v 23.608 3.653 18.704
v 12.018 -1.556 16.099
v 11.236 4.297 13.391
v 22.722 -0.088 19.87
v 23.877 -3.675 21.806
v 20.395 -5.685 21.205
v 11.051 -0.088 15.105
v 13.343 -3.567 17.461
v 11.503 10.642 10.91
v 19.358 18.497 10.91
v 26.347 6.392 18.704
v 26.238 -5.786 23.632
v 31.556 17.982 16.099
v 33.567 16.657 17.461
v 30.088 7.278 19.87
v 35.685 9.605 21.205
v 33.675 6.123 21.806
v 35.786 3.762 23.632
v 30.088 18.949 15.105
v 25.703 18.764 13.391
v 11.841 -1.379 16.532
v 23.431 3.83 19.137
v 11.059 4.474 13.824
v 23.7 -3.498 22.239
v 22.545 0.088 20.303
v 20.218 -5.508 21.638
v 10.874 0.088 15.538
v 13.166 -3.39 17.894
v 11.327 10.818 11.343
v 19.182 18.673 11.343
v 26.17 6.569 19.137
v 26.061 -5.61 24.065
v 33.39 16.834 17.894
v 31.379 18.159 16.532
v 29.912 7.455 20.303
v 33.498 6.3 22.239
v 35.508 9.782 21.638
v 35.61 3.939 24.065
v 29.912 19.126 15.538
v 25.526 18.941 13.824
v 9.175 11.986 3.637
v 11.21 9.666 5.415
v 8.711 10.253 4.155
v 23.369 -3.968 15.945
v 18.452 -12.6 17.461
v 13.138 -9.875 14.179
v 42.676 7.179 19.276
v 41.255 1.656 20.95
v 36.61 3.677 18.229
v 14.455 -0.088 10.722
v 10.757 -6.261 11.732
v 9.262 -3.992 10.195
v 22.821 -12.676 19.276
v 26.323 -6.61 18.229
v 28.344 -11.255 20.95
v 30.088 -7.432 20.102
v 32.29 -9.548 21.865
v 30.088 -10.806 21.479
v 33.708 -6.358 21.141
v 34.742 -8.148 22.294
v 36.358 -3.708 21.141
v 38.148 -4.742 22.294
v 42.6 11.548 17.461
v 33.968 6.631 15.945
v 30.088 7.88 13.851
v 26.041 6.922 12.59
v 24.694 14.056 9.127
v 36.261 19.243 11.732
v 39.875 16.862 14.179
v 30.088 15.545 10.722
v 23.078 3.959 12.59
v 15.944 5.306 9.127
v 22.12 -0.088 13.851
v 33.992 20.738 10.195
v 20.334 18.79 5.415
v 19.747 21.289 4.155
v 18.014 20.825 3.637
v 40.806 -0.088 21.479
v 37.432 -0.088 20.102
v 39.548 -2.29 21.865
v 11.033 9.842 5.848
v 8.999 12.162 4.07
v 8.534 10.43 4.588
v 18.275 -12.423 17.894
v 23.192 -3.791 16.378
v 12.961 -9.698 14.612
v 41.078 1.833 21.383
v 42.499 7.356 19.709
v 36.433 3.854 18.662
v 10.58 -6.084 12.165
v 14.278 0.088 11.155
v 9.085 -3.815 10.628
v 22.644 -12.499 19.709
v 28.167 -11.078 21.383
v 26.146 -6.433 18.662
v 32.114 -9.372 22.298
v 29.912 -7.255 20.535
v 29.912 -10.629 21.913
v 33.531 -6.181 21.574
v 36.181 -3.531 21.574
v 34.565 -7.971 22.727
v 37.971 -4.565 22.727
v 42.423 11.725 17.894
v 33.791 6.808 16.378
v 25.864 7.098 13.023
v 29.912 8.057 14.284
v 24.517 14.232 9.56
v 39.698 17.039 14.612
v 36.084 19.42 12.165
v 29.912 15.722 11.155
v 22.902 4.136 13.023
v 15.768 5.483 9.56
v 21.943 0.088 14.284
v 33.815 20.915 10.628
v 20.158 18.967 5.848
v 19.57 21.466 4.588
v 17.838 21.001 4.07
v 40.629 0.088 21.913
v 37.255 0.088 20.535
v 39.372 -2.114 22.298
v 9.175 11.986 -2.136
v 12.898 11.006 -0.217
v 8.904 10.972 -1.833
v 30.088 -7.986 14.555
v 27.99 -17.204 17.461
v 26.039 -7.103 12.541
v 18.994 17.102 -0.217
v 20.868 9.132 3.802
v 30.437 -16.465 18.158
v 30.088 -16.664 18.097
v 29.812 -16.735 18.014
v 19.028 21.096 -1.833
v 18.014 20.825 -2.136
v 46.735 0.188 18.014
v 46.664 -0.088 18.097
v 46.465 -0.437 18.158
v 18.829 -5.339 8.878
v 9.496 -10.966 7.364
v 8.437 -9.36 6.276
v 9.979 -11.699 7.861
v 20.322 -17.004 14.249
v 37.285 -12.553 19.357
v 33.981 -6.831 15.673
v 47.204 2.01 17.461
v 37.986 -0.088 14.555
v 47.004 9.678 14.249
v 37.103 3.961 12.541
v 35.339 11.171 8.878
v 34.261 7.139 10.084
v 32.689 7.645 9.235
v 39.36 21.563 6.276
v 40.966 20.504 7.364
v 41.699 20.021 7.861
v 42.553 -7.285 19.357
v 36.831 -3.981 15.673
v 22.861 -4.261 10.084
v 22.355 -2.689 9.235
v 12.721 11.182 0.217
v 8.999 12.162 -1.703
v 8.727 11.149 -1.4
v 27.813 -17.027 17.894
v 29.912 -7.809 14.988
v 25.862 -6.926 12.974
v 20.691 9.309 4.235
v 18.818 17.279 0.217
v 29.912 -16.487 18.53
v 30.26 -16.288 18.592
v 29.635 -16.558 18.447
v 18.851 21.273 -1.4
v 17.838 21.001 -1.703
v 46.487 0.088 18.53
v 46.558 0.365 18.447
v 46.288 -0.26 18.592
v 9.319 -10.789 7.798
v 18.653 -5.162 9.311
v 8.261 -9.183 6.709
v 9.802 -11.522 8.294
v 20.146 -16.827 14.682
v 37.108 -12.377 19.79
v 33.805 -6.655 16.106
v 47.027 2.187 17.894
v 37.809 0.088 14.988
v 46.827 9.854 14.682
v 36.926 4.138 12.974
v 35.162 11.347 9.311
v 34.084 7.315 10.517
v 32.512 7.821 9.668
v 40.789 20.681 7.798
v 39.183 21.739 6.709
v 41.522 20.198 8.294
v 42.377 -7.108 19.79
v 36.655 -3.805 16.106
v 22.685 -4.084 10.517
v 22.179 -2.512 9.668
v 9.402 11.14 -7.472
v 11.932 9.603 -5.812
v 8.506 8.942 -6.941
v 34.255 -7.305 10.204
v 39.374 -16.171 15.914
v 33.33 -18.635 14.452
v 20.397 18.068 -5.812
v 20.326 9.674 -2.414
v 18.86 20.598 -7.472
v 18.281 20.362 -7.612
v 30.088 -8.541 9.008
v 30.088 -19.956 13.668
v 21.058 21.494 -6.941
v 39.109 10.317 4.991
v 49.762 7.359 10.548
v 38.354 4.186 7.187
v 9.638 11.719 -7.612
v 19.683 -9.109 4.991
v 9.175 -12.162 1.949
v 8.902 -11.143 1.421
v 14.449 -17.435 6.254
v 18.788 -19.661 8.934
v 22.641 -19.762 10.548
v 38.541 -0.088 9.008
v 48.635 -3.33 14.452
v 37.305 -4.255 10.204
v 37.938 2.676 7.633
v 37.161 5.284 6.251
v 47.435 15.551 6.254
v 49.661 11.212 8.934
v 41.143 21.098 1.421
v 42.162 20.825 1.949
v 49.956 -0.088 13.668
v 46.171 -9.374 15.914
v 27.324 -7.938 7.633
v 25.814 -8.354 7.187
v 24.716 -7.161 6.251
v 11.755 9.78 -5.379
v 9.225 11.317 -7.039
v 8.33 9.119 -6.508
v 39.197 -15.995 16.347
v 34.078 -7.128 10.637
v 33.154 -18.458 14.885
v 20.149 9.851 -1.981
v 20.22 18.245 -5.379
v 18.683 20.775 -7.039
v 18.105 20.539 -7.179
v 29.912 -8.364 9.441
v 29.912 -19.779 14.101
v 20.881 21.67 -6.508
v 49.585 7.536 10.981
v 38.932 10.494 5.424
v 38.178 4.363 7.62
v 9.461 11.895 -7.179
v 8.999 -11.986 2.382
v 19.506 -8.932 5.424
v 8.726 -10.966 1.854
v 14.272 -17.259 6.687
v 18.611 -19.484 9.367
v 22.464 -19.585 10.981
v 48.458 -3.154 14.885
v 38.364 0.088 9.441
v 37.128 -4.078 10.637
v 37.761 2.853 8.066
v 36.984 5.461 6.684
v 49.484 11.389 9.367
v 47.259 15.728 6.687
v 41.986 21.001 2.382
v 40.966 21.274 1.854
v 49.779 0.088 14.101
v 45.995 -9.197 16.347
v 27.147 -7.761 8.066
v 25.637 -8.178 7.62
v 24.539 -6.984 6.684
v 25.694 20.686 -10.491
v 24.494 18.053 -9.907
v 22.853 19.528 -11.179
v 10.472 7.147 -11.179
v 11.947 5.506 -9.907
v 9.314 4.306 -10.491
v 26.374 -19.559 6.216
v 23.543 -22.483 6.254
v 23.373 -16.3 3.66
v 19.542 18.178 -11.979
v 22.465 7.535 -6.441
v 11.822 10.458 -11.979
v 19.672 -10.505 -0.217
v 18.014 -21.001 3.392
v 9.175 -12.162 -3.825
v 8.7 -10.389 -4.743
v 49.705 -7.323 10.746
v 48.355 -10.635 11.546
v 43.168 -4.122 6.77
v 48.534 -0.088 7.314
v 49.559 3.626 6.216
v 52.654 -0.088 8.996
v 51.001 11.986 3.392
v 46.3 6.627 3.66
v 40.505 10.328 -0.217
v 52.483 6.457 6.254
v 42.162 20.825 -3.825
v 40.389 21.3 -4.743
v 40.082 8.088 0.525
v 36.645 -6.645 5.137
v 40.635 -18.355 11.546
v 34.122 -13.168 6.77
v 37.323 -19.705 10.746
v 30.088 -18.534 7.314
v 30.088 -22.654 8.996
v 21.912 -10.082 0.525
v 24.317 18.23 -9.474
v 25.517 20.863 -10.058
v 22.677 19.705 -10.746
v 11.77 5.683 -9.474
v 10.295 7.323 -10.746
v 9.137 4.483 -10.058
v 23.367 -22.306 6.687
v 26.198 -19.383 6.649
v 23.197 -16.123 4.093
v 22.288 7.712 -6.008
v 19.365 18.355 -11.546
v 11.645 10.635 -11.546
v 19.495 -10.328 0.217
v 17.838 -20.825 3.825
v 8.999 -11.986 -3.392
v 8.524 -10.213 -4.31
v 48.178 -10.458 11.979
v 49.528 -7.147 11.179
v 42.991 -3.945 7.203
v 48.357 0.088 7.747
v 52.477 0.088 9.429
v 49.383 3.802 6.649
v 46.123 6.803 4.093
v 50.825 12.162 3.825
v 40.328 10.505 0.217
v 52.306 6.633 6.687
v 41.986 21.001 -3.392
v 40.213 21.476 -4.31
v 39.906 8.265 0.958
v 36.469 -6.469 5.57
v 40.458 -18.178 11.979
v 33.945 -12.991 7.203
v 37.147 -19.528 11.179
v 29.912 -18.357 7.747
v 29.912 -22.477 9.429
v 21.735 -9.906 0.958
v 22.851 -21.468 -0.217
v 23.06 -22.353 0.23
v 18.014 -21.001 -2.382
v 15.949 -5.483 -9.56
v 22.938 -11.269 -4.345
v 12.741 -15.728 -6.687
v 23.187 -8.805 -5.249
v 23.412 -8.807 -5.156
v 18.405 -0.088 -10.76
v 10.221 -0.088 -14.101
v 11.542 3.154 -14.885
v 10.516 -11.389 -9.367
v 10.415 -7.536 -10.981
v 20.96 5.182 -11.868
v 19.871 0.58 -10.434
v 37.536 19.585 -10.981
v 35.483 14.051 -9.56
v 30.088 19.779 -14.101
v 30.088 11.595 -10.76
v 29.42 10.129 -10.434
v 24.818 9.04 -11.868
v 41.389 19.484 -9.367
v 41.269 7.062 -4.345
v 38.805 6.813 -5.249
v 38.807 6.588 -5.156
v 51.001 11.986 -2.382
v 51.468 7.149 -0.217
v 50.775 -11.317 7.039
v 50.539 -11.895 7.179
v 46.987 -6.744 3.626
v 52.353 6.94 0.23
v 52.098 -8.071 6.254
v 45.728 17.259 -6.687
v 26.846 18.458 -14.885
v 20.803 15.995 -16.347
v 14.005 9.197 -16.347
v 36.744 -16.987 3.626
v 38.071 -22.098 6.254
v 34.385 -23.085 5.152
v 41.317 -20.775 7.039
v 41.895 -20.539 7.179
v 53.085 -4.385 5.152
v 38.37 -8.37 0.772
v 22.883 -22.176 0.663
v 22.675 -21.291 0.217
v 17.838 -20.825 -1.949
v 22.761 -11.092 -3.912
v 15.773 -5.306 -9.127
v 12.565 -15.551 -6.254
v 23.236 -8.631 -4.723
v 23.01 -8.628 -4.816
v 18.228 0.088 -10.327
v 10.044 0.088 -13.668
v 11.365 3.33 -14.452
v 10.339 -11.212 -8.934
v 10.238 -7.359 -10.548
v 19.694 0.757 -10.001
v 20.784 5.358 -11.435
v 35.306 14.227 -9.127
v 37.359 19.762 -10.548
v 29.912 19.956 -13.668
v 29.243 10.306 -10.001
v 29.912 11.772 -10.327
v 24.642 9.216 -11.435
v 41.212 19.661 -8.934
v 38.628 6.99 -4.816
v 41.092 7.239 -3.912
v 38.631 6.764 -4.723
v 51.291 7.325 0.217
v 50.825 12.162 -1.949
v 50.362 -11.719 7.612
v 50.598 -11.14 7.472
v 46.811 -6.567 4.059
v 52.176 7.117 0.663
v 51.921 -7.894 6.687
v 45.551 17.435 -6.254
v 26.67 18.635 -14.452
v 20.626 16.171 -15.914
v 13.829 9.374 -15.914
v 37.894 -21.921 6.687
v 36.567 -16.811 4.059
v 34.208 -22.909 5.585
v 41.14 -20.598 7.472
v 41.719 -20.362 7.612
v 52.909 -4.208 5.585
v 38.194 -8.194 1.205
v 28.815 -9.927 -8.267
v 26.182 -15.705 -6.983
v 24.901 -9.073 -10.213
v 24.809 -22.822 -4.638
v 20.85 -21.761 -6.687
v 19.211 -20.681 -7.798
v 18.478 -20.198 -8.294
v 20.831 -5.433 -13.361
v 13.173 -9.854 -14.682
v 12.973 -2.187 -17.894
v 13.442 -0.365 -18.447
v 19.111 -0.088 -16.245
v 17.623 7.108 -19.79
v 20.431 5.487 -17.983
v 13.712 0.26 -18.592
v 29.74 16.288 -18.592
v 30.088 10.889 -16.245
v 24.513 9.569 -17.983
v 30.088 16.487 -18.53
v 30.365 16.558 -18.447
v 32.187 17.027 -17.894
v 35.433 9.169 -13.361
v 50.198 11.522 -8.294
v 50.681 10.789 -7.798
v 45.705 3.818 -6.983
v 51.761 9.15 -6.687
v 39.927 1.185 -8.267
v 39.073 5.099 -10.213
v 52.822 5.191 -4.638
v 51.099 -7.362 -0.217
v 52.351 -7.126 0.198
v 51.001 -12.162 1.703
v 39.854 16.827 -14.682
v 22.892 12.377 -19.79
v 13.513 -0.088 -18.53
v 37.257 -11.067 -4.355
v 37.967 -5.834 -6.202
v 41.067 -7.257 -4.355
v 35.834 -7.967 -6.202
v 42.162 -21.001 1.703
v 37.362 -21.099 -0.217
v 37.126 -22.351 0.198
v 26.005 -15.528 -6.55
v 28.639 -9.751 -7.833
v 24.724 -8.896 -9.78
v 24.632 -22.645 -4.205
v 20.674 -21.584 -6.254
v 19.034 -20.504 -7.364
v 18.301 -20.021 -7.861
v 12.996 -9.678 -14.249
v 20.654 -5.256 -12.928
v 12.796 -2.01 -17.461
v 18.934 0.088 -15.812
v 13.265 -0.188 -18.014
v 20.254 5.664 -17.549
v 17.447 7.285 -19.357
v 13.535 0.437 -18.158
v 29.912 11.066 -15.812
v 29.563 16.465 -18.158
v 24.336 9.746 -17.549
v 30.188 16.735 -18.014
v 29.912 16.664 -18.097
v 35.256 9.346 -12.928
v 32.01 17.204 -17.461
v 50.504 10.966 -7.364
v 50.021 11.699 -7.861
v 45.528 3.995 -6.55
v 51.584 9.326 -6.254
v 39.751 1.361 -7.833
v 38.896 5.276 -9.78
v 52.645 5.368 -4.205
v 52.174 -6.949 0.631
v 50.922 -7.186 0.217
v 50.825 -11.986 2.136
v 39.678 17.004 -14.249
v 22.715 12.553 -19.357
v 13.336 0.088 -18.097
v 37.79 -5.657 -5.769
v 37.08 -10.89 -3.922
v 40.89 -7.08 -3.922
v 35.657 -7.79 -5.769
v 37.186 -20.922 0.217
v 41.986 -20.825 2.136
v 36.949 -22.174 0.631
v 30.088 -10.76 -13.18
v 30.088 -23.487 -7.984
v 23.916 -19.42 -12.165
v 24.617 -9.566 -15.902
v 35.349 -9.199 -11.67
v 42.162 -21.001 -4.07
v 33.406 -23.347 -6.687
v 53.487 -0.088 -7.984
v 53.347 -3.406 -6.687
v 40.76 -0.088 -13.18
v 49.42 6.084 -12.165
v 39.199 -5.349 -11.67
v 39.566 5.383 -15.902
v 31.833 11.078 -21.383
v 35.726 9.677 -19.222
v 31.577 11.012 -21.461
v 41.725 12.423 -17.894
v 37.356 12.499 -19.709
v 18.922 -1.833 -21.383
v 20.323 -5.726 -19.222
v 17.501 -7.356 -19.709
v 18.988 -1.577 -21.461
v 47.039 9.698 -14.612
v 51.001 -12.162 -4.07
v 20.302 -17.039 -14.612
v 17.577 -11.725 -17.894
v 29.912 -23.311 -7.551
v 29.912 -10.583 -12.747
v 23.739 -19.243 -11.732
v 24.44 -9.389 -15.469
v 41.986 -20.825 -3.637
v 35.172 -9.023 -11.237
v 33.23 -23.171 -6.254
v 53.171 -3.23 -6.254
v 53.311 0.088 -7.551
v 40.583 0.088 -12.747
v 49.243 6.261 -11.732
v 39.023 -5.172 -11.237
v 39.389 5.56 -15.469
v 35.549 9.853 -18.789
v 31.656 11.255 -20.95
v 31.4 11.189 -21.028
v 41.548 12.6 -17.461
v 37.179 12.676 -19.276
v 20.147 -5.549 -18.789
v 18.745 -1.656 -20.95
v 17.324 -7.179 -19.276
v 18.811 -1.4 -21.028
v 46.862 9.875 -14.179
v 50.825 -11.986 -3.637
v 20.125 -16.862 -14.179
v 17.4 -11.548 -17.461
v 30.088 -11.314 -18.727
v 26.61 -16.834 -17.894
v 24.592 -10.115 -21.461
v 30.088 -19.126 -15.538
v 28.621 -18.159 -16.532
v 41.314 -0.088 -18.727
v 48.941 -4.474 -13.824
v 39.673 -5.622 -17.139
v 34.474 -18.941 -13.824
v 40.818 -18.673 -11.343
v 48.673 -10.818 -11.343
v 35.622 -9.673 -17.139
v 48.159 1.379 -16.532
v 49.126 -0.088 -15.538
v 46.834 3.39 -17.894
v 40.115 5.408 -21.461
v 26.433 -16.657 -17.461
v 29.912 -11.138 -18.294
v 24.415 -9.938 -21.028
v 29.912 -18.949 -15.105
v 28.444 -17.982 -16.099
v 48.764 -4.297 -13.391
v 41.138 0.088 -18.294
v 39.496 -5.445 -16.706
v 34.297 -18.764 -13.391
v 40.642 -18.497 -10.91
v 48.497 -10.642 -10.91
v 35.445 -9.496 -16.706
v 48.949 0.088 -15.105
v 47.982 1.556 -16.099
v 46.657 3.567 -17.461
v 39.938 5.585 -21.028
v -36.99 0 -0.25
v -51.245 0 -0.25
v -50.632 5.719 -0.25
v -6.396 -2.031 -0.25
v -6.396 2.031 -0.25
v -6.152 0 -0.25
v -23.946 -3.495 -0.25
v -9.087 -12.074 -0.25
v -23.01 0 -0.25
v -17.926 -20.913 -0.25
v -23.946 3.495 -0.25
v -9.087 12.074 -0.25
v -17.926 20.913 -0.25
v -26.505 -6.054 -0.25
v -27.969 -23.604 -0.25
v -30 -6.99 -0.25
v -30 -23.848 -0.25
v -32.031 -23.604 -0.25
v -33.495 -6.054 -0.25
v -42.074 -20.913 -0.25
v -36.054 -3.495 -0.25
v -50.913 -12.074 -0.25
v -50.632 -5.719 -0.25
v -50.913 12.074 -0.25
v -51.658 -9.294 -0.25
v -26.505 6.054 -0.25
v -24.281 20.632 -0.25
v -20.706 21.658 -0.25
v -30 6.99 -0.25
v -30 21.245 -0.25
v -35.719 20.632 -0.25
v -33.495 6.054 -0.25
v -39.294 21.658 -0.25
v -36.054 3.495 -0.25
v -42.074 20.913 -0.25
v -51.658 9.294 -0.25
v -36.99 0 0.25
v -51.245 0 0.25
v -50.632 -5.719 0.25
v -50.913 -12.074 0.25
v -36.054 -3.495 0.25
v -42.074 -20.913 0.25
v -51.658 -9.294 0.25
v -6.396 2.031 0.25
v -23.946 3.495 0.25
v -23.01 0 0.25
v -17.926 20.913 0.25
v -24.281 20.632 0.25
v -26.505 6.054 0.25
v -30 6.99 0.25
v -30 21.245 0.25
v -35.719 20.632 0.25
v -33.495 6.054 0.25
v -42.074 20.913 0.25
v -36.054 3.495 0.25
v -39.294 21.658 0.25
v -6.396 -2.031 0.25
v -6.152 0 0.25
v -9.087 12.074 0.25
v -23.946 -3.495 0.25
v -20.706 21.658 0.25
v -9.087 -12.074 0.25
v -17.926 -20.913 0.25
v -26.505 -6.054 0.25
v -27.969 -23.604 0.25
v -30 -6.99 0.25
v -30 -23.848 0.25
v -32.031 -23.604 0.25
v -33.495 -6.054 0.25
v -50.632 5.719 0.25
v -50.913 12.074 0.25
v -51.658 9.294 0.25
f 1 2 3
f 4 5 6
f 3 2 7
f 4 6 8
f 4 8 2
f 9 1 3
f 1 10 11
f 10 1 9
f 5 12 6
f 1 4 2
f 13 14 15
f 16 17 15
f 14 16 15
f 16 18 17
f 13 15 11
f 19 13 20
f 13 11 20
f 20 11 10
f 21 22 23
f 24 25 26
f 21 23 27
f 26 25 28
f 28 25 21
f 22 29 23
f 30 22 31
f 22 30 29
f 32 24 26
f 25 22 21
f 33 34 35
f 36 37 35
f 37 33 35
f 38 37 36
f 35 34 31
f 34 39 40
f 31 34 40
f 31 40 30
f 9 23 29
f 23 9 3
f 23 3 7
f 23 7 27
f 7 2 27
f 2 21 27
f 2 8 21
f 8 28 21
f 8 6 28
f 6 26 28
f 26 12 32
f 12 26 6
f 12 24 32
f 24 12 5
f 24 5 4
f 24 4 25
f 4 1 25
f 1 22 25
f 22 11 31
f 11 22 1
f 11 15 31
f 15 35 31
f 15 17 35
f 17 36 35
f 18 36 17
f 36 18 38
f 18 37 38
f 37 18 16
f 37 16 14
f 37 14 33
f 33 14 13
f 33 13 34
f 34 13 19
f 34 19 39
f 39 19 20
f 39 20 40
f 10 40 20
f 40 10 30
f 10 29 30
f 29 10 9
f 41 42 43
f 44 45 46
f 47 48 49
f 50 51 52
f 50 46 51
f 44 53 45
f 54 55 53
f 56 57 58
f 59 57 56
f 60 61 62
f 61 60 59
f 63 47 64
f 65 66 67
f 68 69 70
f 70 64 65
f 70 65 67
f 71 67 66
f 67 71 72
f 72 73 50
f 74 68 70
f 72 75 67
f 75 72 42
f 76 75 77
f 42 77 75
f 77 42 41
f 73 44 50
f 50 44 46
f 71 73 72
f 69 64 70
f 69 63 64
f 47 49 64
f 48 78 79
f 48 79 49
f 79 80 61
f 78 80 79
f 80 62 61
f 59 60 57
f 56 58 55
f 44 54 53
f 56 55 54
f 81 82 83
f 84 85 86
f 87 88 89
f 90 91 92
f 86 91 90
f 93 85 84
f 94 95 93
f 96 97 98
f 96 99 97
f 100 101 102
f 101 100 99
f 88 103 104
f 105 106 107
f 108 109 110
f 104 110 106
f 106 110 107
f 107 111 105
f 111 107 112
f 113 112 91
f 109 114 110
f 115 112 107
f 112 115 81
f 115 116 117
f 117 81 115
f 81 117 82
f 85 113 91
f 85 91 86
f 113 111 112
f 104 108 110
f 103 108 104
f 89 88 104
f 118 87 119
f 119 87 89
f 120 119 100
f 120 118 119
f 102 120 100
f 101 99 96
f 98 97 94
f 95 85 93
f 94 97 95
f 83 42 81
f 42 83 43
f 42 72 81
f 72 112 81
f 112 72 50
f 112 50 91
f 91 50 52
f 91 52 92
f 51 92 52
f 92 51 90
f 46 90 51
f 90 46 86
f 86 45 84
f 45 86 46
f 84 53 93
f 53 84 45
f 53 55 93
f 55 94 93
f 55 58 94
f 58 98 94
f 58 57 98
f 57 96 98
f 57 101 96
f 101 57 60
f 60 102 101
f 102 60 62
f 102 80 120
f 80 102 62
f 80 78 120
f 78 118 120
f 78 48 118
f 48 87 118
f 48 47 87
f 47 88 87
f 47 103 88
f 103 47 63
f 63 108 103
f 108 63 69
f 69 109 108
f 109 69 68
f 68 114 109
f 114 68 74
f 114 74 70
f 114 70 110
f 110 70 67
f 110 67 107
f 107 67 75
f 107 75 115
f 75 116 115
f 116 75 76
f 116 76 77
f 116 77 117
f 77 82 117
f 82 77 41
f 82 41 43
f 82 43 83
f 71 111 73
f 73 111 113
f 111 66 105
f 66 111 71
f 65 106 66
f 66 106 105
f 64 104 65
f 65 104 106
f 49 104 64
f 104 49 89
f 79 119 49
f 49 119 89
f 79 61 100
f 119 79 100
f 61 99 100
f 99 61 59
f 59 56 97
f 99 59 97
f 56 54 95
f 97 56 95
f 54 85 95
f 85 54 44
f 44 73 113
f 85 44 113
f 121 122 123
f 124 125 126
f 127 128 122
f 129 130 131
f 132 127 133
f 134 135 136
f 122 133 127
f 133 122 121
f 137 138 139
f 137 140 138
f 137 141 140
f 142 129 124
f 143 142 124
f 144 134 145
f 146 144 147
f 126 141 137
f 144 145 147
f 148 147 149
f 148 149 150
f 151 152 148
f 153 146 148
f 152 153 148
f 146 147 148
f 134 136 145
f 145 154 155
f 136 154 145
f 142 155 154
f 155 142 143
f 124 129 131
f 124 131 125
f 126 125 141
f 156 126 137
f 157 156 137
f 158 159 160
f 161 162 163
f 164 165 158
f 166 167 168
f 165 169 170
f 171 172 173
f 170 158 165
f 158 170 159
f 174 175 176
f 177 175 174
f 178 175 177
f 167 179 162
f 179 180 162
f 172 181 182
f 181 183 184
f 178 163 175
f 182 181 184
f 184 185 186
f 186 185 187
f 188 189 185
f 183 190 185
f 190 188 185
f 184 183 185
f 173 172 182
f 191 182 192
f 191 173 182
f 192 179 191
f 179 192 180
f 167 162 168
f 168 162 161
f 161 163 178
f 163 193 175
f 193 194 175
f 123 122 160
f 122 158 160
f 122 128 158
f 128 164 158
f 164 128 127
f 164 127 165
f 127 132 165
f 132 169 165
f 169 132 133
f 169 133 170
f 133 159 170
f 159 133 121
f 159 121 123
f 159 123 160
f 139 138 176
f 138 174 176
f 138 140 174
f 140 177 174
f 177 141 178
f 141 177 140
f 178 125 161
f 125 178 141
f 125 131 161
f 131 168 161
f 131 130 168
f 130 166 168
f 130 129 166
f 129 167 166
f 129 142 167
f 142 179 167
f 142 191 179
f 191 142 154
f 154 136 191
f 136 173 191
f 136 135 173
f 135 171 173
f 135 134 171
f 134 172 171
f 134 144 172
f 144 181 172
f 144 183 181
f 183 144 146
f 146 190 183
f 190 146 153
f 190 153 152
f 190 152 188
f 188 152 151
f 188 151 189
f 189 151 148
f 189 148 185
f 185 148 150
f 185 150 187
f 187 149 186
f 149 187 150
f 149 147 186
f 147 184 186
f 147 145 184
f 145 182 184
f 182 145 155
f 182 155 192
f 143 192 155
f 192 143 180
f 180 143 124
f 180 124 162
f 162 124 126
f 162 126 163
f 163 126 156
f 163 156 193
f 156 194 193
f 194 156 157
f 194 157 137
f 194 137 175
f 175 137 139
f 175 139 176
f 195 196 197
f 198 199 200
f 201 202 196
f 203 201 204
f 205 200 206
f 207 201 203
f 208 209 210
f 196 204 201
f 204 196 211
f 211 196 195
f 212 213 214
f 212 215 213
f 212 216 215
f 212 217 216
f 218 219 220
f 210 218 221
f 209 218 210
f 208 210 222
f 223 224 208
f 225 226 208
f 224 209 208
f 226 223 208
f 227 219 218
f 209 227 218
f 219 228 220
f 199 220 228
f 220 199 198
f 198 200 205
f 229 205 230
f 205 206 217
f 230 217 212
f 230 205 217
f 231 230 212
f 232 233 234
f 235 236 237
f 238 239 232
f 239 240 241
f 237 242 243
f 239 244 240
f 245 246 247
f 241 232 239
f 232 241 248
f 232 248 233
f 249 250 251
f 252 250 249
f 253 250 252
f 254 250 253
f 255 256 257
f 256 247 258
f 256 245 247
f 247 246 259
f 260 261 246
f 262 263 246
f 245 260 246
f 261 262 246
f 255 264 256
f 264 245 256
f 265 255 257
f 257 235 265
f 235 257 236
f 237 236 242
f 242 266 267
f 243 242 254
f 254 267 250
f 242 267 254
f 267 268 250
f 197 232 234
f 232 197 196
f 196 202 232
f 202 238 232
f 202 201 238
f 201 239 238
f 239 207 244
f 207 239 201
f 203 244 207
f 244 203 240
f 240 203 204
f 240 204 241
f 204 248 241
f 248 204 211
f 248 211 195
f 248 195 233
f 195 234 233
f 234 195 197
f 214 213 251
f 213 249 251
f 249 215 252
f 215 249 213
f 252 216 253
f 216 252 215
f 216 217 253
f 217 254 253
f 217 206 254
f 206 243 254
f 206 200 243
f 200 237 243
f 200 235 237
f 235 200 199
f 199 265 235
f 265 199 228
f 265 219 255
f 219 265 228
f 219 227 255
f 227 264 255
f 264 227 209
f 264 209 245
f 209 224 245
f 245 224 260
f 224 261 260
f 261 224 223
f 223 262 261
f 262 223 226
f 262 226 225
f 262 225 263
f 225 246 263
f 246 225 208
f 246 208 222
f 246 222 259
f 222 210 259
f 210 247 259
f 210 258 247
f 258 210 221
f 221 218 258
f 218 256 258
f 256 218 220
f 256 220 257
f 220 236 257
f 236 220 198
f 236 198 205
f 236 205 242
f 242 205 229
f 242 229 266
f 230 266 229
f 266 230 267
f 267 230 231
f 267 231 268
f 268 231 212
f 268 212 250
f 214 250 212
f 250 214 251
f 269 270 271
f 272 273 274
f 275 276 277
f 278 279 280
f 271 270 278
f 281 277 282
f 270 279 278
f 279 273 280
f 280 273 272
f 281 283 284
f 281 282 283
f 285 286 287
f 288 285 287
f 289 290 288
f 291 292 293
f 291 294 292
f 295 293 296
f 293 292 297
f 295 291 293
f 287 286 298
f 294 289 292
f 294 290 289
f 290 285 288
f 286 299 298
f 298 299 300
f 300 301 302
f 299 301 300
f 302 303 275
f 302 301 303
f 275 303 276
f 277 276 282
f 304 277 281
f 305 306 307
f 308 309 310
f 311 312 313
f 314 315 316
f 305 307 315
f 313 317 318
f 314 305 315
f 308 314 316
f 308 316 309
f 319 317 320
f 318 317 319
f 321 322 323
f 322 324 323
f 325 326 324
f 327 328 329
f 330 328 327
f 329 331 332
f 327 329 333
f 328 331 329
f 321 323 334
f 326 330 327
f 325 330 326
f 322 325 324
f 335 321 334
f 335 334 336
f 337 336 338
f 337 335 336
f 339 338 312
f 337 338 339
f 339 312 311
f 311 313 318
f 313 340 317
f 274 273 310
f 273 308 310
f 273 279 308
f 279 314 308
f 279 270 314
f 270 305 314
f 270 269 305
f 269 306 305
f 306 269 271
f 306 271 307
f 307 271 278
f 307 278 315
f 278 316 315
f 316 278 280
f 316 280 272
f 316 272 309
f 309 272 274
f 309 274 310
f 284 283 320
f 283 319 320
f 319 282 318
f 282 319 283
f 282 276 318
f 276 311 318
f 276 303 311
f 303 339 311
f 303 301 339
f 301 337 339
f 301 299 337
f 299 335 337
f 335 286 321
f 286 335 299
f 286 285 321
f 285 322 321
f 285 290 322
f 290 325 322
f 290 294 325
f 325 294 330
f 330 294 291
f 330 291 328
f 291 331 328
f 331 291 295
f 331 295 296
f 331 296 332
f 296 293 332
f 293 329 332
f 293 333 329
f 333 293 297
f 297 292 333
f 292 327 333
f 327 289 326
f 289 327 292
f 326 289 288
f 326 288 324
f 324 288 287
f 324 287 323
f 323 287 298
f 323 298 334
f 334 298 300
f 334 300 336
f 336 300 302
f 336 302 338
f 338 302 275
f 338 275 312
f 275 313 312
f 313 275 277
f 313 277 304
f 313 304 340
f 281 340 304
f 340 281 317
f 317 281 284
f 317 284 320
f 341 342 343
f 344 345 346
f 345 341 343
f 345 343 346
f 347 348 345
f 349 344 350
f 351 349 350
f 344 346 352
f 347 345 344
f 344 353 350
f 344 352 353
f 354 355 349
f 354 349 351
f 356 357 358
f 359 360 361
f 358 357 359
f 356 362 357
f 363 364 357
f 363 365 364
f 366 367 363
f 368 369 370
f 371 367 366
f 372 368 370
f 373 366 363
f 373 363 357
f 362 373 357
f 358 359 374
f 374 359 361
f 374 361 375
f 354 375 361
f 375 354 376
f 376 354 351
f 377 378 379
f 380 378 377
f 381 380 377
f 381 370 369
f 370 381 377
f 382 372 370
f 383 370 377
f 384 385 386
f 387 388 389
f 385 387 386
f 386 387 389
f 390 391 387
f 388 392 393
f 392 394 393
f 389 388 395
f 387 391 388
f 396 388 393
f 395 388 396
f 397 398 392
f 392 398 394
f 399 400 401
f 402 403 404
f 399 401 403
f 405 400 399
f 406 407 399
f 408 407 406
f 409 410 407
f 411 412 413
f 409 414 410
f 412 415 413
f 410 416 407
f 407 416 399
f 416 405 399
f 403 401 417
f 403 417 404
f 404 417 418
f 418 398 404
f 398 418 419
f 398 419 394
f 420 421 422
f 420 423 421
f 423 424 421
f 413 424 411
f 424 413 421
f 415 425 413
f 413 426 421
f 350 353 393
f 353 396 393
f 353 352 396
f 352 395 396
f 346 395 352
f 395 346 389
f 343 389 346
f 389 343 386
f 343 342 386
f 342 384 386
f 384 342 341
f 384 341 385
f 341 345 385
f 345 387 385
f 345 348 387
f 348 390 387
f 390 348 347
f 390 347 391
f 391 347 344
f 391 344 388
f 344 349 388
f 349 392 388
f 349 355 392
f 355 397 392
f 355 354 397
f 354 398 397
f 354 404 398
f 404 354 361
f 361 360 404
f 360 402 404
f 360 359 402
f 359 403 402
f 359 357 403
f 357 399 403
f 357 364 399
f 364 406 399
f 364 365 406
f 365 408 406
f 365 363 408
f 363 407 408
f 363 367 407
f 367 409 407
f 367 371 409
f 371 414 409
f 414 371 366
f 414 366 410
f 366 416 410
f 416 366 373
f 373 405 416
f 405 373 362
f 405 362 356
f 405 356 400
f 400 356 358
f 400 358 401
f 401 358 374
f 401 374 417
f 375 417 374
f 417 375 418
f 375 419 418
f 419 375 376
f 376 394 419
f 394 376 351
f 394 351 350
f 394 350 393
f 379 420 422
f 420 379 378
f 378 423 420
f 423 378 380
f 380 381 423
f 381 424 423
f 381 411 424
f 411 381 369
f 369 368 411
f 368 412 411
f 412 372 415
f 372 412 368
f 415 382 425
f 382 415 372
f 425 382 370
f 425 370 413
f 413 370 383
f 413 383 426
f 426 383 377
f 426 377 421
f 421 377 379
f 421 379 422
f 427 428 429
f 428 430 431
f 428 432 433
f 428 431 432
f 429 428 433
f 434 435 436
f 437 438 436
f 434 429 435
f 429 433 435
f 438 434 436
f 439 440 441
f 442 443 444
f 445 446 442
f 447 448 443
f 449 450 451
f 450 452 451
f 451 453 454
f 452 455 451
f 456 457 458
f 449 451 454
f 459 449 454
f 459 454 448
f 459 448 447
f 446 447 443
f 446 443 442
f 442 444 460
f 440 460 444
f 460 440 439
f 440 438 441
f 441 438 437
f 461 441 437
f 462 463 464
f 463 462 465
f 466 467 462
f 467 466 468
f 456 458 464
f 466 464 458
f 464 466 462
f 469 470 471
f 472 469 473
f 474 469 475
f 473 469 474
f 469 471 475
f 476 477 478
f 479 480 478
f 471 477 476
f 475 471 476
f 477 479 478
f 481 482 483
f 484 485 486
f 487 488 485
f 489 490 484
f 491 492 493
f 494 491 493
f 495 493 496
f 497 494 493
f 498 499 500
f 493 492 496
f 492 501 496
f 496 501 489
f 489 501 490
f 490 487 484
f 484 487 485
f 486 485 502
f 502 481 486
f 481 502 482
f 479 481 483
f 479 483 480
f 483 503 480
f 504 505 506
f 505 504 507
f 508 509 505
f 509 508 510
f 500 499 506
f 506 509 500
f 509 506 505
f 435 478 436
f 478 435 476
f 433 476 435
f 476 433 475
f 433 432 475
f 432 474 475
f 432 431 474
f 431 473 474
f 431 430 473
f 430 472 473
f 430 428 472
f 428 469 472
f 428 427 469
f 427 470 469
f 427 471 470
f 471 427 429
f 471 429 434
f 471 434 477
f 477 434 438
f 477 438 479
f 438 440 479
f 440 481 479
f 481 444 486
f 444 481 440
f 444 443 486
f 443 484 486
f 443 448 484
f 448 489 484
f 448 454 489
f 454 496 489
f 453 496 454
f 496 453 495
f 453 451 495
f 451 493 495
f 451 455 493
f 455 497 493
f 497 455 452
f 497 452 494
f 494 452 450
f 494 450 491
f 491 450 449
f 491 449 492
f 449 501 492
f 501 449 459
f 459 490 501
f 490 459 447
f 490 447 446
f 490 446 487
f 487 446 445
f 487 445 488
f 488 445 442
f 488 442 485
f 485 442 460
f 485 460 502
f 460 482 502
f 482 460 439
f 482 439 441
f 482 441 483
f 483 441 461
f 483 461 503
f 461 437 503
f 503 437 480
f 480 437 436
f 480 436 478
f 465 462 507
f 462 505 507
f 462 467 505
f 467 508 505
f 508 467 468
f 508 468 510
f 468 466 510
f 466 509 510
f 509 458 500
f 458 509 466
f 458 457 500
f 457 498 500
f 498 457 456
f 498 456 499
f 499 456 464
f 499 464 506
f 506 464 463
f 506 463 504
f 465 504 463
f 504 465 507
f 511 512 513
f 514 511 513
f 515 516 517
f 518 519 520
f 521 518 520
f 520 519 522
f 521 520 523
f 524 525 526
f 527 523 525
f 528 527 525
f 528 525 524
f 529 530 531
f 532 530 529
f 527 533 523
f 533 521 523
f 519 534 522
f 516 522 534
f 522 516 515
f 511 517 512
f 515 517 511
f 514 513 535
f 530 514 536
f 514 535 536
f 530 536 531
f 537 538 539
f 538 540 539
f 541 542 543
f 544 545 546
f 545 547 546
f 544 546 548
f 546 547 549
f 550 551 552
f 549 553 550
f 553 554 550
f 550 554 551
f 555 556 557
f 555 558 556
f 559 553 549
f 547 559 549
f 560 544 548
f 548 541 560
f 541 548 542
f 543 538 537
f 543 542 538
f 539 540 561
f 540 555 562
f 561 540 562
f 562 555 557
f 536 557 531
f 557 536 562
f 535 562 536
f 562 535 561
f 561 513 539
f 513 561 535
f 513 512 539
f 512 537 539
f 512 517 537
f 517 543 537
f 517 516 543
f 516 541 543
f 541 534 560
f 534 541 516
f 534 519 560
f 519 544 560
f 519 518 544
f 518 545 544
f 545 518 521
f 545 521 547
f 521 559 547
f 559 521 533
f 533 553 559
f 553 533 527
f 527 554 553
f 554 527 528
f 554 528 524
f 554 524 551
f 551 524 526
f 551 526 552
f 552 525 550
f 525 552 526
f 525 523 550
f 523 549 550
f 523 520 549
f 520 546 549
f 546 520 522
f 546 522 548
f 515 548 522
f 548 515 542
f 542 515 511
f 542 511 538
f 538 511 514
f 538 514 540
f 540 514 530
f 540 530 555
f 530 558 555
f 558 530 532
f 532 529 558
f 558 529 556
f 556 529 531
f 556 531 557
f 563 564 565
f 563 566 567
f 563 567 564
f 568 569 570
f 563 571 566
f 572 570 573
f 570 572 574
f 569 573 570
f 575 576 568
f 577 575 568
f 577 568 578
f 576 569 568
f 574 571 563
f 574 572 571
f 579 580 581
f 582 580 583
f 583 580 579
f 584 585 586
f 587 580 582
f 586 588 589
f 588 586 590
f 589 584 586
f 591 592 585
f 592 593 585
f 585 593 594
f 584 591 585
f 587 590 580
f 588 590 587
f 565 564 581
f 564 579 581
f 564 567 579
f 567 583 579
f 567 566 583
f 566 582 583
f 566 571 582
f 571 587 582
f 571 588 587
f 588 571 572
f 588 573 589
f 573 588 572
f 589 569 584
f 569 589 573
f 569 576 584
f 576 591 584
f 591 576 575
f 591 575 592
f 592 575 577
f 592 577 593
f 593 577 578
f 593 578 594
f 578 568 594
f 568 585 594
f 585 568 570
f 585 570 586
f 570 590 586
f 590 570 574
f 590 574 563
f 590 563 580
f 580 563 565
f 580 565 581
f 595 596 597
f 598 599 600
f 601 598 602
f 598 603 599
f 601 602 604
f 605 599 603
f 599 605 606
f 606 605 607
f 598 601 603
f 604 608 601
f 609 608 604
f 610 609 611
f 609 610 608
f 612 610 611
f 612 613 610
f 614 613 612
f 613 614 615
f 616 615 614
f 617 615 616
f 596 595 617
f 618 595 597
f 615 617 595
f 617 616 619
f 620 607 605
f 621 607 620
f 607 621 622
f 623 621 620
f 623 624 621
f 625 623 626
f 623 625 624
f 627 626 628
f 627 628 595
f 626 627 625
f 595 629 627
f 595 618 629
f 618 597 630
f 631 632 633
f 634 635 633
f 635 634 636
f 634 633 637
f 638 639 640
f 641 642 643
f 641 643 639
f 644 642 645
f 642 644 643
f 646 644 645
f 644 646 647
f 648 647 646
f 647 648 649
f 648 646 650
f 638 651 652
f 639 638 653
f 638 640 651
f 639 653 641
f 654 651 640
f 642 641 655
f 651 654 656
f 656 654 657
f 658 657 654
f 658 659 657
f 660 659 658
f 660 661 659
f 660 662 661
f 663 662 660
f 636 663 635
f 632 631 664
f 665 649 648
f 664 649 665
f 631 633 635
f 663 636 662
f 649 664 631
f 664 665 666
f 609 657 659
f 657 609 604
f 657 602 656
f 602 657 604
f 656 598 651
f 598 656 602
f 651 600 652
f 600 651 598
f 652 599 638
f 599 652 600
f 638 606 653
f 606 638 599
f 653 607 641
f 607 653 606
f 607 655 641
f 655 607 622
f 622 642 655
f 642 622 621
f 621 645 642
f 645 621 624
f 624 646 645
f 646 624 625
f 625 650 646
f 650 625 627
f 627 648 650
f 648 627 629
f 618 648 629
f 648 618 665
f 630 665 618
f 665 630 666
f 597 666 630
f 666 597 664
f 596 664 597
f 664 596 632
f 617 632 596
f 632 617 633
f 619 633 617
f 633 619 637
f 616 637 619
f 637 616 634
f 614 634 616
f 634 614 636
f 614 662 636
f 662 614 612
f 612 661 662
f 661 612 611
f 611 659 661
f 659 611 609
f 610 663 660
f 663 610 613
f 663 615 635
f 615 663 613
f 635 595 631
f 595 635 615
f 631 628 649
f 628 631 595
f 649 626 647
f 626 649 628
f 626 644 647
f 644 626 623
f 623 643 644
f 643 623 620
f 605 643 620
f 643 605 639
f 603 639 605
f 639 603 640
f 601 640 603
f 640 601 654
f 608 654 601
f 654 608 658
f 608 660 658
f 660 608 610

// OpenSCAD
echo(version=version());

module thing()
{
	$fa = 30;
	difference() {
		sphere(r = 25);
		cylinder(h = 62.5, r1 = 12.5, r2 = 6.25, center = true);
		rotate(90, [ 1, 0, 0 ]) cylinder(h = 62.5,
				r1 = 12.5, r2 = 6.25, center = true);
		rotate(90, [ 0, 1, 0 ]) cylinder(h = 62.5,
				r1 = 12.5, r2 = 6.25, center = true);
	}
}

module demo_proj()
{
	linear_extrude(center = true, height = 0.5) projection(cut = false) thing();
	% thing();
}

module demo_cut()
{
	for (i=[-20:5:+20]) {
		 rotate(-30, [ 1, 1, 0 ]) translate([ 0, 0, -i ])
			linear_extrude(center = true, height = 0.5) projection(cut = true)
				translate([ 0, 0, i ]) rotate(+30, [ 1, 1, 0 ]) thing();
	}
	% thing();
}

translate([ -30, 0, 0 ]) demo_proj();
translate([ +30, 0, 0 ]) demo_cut();
